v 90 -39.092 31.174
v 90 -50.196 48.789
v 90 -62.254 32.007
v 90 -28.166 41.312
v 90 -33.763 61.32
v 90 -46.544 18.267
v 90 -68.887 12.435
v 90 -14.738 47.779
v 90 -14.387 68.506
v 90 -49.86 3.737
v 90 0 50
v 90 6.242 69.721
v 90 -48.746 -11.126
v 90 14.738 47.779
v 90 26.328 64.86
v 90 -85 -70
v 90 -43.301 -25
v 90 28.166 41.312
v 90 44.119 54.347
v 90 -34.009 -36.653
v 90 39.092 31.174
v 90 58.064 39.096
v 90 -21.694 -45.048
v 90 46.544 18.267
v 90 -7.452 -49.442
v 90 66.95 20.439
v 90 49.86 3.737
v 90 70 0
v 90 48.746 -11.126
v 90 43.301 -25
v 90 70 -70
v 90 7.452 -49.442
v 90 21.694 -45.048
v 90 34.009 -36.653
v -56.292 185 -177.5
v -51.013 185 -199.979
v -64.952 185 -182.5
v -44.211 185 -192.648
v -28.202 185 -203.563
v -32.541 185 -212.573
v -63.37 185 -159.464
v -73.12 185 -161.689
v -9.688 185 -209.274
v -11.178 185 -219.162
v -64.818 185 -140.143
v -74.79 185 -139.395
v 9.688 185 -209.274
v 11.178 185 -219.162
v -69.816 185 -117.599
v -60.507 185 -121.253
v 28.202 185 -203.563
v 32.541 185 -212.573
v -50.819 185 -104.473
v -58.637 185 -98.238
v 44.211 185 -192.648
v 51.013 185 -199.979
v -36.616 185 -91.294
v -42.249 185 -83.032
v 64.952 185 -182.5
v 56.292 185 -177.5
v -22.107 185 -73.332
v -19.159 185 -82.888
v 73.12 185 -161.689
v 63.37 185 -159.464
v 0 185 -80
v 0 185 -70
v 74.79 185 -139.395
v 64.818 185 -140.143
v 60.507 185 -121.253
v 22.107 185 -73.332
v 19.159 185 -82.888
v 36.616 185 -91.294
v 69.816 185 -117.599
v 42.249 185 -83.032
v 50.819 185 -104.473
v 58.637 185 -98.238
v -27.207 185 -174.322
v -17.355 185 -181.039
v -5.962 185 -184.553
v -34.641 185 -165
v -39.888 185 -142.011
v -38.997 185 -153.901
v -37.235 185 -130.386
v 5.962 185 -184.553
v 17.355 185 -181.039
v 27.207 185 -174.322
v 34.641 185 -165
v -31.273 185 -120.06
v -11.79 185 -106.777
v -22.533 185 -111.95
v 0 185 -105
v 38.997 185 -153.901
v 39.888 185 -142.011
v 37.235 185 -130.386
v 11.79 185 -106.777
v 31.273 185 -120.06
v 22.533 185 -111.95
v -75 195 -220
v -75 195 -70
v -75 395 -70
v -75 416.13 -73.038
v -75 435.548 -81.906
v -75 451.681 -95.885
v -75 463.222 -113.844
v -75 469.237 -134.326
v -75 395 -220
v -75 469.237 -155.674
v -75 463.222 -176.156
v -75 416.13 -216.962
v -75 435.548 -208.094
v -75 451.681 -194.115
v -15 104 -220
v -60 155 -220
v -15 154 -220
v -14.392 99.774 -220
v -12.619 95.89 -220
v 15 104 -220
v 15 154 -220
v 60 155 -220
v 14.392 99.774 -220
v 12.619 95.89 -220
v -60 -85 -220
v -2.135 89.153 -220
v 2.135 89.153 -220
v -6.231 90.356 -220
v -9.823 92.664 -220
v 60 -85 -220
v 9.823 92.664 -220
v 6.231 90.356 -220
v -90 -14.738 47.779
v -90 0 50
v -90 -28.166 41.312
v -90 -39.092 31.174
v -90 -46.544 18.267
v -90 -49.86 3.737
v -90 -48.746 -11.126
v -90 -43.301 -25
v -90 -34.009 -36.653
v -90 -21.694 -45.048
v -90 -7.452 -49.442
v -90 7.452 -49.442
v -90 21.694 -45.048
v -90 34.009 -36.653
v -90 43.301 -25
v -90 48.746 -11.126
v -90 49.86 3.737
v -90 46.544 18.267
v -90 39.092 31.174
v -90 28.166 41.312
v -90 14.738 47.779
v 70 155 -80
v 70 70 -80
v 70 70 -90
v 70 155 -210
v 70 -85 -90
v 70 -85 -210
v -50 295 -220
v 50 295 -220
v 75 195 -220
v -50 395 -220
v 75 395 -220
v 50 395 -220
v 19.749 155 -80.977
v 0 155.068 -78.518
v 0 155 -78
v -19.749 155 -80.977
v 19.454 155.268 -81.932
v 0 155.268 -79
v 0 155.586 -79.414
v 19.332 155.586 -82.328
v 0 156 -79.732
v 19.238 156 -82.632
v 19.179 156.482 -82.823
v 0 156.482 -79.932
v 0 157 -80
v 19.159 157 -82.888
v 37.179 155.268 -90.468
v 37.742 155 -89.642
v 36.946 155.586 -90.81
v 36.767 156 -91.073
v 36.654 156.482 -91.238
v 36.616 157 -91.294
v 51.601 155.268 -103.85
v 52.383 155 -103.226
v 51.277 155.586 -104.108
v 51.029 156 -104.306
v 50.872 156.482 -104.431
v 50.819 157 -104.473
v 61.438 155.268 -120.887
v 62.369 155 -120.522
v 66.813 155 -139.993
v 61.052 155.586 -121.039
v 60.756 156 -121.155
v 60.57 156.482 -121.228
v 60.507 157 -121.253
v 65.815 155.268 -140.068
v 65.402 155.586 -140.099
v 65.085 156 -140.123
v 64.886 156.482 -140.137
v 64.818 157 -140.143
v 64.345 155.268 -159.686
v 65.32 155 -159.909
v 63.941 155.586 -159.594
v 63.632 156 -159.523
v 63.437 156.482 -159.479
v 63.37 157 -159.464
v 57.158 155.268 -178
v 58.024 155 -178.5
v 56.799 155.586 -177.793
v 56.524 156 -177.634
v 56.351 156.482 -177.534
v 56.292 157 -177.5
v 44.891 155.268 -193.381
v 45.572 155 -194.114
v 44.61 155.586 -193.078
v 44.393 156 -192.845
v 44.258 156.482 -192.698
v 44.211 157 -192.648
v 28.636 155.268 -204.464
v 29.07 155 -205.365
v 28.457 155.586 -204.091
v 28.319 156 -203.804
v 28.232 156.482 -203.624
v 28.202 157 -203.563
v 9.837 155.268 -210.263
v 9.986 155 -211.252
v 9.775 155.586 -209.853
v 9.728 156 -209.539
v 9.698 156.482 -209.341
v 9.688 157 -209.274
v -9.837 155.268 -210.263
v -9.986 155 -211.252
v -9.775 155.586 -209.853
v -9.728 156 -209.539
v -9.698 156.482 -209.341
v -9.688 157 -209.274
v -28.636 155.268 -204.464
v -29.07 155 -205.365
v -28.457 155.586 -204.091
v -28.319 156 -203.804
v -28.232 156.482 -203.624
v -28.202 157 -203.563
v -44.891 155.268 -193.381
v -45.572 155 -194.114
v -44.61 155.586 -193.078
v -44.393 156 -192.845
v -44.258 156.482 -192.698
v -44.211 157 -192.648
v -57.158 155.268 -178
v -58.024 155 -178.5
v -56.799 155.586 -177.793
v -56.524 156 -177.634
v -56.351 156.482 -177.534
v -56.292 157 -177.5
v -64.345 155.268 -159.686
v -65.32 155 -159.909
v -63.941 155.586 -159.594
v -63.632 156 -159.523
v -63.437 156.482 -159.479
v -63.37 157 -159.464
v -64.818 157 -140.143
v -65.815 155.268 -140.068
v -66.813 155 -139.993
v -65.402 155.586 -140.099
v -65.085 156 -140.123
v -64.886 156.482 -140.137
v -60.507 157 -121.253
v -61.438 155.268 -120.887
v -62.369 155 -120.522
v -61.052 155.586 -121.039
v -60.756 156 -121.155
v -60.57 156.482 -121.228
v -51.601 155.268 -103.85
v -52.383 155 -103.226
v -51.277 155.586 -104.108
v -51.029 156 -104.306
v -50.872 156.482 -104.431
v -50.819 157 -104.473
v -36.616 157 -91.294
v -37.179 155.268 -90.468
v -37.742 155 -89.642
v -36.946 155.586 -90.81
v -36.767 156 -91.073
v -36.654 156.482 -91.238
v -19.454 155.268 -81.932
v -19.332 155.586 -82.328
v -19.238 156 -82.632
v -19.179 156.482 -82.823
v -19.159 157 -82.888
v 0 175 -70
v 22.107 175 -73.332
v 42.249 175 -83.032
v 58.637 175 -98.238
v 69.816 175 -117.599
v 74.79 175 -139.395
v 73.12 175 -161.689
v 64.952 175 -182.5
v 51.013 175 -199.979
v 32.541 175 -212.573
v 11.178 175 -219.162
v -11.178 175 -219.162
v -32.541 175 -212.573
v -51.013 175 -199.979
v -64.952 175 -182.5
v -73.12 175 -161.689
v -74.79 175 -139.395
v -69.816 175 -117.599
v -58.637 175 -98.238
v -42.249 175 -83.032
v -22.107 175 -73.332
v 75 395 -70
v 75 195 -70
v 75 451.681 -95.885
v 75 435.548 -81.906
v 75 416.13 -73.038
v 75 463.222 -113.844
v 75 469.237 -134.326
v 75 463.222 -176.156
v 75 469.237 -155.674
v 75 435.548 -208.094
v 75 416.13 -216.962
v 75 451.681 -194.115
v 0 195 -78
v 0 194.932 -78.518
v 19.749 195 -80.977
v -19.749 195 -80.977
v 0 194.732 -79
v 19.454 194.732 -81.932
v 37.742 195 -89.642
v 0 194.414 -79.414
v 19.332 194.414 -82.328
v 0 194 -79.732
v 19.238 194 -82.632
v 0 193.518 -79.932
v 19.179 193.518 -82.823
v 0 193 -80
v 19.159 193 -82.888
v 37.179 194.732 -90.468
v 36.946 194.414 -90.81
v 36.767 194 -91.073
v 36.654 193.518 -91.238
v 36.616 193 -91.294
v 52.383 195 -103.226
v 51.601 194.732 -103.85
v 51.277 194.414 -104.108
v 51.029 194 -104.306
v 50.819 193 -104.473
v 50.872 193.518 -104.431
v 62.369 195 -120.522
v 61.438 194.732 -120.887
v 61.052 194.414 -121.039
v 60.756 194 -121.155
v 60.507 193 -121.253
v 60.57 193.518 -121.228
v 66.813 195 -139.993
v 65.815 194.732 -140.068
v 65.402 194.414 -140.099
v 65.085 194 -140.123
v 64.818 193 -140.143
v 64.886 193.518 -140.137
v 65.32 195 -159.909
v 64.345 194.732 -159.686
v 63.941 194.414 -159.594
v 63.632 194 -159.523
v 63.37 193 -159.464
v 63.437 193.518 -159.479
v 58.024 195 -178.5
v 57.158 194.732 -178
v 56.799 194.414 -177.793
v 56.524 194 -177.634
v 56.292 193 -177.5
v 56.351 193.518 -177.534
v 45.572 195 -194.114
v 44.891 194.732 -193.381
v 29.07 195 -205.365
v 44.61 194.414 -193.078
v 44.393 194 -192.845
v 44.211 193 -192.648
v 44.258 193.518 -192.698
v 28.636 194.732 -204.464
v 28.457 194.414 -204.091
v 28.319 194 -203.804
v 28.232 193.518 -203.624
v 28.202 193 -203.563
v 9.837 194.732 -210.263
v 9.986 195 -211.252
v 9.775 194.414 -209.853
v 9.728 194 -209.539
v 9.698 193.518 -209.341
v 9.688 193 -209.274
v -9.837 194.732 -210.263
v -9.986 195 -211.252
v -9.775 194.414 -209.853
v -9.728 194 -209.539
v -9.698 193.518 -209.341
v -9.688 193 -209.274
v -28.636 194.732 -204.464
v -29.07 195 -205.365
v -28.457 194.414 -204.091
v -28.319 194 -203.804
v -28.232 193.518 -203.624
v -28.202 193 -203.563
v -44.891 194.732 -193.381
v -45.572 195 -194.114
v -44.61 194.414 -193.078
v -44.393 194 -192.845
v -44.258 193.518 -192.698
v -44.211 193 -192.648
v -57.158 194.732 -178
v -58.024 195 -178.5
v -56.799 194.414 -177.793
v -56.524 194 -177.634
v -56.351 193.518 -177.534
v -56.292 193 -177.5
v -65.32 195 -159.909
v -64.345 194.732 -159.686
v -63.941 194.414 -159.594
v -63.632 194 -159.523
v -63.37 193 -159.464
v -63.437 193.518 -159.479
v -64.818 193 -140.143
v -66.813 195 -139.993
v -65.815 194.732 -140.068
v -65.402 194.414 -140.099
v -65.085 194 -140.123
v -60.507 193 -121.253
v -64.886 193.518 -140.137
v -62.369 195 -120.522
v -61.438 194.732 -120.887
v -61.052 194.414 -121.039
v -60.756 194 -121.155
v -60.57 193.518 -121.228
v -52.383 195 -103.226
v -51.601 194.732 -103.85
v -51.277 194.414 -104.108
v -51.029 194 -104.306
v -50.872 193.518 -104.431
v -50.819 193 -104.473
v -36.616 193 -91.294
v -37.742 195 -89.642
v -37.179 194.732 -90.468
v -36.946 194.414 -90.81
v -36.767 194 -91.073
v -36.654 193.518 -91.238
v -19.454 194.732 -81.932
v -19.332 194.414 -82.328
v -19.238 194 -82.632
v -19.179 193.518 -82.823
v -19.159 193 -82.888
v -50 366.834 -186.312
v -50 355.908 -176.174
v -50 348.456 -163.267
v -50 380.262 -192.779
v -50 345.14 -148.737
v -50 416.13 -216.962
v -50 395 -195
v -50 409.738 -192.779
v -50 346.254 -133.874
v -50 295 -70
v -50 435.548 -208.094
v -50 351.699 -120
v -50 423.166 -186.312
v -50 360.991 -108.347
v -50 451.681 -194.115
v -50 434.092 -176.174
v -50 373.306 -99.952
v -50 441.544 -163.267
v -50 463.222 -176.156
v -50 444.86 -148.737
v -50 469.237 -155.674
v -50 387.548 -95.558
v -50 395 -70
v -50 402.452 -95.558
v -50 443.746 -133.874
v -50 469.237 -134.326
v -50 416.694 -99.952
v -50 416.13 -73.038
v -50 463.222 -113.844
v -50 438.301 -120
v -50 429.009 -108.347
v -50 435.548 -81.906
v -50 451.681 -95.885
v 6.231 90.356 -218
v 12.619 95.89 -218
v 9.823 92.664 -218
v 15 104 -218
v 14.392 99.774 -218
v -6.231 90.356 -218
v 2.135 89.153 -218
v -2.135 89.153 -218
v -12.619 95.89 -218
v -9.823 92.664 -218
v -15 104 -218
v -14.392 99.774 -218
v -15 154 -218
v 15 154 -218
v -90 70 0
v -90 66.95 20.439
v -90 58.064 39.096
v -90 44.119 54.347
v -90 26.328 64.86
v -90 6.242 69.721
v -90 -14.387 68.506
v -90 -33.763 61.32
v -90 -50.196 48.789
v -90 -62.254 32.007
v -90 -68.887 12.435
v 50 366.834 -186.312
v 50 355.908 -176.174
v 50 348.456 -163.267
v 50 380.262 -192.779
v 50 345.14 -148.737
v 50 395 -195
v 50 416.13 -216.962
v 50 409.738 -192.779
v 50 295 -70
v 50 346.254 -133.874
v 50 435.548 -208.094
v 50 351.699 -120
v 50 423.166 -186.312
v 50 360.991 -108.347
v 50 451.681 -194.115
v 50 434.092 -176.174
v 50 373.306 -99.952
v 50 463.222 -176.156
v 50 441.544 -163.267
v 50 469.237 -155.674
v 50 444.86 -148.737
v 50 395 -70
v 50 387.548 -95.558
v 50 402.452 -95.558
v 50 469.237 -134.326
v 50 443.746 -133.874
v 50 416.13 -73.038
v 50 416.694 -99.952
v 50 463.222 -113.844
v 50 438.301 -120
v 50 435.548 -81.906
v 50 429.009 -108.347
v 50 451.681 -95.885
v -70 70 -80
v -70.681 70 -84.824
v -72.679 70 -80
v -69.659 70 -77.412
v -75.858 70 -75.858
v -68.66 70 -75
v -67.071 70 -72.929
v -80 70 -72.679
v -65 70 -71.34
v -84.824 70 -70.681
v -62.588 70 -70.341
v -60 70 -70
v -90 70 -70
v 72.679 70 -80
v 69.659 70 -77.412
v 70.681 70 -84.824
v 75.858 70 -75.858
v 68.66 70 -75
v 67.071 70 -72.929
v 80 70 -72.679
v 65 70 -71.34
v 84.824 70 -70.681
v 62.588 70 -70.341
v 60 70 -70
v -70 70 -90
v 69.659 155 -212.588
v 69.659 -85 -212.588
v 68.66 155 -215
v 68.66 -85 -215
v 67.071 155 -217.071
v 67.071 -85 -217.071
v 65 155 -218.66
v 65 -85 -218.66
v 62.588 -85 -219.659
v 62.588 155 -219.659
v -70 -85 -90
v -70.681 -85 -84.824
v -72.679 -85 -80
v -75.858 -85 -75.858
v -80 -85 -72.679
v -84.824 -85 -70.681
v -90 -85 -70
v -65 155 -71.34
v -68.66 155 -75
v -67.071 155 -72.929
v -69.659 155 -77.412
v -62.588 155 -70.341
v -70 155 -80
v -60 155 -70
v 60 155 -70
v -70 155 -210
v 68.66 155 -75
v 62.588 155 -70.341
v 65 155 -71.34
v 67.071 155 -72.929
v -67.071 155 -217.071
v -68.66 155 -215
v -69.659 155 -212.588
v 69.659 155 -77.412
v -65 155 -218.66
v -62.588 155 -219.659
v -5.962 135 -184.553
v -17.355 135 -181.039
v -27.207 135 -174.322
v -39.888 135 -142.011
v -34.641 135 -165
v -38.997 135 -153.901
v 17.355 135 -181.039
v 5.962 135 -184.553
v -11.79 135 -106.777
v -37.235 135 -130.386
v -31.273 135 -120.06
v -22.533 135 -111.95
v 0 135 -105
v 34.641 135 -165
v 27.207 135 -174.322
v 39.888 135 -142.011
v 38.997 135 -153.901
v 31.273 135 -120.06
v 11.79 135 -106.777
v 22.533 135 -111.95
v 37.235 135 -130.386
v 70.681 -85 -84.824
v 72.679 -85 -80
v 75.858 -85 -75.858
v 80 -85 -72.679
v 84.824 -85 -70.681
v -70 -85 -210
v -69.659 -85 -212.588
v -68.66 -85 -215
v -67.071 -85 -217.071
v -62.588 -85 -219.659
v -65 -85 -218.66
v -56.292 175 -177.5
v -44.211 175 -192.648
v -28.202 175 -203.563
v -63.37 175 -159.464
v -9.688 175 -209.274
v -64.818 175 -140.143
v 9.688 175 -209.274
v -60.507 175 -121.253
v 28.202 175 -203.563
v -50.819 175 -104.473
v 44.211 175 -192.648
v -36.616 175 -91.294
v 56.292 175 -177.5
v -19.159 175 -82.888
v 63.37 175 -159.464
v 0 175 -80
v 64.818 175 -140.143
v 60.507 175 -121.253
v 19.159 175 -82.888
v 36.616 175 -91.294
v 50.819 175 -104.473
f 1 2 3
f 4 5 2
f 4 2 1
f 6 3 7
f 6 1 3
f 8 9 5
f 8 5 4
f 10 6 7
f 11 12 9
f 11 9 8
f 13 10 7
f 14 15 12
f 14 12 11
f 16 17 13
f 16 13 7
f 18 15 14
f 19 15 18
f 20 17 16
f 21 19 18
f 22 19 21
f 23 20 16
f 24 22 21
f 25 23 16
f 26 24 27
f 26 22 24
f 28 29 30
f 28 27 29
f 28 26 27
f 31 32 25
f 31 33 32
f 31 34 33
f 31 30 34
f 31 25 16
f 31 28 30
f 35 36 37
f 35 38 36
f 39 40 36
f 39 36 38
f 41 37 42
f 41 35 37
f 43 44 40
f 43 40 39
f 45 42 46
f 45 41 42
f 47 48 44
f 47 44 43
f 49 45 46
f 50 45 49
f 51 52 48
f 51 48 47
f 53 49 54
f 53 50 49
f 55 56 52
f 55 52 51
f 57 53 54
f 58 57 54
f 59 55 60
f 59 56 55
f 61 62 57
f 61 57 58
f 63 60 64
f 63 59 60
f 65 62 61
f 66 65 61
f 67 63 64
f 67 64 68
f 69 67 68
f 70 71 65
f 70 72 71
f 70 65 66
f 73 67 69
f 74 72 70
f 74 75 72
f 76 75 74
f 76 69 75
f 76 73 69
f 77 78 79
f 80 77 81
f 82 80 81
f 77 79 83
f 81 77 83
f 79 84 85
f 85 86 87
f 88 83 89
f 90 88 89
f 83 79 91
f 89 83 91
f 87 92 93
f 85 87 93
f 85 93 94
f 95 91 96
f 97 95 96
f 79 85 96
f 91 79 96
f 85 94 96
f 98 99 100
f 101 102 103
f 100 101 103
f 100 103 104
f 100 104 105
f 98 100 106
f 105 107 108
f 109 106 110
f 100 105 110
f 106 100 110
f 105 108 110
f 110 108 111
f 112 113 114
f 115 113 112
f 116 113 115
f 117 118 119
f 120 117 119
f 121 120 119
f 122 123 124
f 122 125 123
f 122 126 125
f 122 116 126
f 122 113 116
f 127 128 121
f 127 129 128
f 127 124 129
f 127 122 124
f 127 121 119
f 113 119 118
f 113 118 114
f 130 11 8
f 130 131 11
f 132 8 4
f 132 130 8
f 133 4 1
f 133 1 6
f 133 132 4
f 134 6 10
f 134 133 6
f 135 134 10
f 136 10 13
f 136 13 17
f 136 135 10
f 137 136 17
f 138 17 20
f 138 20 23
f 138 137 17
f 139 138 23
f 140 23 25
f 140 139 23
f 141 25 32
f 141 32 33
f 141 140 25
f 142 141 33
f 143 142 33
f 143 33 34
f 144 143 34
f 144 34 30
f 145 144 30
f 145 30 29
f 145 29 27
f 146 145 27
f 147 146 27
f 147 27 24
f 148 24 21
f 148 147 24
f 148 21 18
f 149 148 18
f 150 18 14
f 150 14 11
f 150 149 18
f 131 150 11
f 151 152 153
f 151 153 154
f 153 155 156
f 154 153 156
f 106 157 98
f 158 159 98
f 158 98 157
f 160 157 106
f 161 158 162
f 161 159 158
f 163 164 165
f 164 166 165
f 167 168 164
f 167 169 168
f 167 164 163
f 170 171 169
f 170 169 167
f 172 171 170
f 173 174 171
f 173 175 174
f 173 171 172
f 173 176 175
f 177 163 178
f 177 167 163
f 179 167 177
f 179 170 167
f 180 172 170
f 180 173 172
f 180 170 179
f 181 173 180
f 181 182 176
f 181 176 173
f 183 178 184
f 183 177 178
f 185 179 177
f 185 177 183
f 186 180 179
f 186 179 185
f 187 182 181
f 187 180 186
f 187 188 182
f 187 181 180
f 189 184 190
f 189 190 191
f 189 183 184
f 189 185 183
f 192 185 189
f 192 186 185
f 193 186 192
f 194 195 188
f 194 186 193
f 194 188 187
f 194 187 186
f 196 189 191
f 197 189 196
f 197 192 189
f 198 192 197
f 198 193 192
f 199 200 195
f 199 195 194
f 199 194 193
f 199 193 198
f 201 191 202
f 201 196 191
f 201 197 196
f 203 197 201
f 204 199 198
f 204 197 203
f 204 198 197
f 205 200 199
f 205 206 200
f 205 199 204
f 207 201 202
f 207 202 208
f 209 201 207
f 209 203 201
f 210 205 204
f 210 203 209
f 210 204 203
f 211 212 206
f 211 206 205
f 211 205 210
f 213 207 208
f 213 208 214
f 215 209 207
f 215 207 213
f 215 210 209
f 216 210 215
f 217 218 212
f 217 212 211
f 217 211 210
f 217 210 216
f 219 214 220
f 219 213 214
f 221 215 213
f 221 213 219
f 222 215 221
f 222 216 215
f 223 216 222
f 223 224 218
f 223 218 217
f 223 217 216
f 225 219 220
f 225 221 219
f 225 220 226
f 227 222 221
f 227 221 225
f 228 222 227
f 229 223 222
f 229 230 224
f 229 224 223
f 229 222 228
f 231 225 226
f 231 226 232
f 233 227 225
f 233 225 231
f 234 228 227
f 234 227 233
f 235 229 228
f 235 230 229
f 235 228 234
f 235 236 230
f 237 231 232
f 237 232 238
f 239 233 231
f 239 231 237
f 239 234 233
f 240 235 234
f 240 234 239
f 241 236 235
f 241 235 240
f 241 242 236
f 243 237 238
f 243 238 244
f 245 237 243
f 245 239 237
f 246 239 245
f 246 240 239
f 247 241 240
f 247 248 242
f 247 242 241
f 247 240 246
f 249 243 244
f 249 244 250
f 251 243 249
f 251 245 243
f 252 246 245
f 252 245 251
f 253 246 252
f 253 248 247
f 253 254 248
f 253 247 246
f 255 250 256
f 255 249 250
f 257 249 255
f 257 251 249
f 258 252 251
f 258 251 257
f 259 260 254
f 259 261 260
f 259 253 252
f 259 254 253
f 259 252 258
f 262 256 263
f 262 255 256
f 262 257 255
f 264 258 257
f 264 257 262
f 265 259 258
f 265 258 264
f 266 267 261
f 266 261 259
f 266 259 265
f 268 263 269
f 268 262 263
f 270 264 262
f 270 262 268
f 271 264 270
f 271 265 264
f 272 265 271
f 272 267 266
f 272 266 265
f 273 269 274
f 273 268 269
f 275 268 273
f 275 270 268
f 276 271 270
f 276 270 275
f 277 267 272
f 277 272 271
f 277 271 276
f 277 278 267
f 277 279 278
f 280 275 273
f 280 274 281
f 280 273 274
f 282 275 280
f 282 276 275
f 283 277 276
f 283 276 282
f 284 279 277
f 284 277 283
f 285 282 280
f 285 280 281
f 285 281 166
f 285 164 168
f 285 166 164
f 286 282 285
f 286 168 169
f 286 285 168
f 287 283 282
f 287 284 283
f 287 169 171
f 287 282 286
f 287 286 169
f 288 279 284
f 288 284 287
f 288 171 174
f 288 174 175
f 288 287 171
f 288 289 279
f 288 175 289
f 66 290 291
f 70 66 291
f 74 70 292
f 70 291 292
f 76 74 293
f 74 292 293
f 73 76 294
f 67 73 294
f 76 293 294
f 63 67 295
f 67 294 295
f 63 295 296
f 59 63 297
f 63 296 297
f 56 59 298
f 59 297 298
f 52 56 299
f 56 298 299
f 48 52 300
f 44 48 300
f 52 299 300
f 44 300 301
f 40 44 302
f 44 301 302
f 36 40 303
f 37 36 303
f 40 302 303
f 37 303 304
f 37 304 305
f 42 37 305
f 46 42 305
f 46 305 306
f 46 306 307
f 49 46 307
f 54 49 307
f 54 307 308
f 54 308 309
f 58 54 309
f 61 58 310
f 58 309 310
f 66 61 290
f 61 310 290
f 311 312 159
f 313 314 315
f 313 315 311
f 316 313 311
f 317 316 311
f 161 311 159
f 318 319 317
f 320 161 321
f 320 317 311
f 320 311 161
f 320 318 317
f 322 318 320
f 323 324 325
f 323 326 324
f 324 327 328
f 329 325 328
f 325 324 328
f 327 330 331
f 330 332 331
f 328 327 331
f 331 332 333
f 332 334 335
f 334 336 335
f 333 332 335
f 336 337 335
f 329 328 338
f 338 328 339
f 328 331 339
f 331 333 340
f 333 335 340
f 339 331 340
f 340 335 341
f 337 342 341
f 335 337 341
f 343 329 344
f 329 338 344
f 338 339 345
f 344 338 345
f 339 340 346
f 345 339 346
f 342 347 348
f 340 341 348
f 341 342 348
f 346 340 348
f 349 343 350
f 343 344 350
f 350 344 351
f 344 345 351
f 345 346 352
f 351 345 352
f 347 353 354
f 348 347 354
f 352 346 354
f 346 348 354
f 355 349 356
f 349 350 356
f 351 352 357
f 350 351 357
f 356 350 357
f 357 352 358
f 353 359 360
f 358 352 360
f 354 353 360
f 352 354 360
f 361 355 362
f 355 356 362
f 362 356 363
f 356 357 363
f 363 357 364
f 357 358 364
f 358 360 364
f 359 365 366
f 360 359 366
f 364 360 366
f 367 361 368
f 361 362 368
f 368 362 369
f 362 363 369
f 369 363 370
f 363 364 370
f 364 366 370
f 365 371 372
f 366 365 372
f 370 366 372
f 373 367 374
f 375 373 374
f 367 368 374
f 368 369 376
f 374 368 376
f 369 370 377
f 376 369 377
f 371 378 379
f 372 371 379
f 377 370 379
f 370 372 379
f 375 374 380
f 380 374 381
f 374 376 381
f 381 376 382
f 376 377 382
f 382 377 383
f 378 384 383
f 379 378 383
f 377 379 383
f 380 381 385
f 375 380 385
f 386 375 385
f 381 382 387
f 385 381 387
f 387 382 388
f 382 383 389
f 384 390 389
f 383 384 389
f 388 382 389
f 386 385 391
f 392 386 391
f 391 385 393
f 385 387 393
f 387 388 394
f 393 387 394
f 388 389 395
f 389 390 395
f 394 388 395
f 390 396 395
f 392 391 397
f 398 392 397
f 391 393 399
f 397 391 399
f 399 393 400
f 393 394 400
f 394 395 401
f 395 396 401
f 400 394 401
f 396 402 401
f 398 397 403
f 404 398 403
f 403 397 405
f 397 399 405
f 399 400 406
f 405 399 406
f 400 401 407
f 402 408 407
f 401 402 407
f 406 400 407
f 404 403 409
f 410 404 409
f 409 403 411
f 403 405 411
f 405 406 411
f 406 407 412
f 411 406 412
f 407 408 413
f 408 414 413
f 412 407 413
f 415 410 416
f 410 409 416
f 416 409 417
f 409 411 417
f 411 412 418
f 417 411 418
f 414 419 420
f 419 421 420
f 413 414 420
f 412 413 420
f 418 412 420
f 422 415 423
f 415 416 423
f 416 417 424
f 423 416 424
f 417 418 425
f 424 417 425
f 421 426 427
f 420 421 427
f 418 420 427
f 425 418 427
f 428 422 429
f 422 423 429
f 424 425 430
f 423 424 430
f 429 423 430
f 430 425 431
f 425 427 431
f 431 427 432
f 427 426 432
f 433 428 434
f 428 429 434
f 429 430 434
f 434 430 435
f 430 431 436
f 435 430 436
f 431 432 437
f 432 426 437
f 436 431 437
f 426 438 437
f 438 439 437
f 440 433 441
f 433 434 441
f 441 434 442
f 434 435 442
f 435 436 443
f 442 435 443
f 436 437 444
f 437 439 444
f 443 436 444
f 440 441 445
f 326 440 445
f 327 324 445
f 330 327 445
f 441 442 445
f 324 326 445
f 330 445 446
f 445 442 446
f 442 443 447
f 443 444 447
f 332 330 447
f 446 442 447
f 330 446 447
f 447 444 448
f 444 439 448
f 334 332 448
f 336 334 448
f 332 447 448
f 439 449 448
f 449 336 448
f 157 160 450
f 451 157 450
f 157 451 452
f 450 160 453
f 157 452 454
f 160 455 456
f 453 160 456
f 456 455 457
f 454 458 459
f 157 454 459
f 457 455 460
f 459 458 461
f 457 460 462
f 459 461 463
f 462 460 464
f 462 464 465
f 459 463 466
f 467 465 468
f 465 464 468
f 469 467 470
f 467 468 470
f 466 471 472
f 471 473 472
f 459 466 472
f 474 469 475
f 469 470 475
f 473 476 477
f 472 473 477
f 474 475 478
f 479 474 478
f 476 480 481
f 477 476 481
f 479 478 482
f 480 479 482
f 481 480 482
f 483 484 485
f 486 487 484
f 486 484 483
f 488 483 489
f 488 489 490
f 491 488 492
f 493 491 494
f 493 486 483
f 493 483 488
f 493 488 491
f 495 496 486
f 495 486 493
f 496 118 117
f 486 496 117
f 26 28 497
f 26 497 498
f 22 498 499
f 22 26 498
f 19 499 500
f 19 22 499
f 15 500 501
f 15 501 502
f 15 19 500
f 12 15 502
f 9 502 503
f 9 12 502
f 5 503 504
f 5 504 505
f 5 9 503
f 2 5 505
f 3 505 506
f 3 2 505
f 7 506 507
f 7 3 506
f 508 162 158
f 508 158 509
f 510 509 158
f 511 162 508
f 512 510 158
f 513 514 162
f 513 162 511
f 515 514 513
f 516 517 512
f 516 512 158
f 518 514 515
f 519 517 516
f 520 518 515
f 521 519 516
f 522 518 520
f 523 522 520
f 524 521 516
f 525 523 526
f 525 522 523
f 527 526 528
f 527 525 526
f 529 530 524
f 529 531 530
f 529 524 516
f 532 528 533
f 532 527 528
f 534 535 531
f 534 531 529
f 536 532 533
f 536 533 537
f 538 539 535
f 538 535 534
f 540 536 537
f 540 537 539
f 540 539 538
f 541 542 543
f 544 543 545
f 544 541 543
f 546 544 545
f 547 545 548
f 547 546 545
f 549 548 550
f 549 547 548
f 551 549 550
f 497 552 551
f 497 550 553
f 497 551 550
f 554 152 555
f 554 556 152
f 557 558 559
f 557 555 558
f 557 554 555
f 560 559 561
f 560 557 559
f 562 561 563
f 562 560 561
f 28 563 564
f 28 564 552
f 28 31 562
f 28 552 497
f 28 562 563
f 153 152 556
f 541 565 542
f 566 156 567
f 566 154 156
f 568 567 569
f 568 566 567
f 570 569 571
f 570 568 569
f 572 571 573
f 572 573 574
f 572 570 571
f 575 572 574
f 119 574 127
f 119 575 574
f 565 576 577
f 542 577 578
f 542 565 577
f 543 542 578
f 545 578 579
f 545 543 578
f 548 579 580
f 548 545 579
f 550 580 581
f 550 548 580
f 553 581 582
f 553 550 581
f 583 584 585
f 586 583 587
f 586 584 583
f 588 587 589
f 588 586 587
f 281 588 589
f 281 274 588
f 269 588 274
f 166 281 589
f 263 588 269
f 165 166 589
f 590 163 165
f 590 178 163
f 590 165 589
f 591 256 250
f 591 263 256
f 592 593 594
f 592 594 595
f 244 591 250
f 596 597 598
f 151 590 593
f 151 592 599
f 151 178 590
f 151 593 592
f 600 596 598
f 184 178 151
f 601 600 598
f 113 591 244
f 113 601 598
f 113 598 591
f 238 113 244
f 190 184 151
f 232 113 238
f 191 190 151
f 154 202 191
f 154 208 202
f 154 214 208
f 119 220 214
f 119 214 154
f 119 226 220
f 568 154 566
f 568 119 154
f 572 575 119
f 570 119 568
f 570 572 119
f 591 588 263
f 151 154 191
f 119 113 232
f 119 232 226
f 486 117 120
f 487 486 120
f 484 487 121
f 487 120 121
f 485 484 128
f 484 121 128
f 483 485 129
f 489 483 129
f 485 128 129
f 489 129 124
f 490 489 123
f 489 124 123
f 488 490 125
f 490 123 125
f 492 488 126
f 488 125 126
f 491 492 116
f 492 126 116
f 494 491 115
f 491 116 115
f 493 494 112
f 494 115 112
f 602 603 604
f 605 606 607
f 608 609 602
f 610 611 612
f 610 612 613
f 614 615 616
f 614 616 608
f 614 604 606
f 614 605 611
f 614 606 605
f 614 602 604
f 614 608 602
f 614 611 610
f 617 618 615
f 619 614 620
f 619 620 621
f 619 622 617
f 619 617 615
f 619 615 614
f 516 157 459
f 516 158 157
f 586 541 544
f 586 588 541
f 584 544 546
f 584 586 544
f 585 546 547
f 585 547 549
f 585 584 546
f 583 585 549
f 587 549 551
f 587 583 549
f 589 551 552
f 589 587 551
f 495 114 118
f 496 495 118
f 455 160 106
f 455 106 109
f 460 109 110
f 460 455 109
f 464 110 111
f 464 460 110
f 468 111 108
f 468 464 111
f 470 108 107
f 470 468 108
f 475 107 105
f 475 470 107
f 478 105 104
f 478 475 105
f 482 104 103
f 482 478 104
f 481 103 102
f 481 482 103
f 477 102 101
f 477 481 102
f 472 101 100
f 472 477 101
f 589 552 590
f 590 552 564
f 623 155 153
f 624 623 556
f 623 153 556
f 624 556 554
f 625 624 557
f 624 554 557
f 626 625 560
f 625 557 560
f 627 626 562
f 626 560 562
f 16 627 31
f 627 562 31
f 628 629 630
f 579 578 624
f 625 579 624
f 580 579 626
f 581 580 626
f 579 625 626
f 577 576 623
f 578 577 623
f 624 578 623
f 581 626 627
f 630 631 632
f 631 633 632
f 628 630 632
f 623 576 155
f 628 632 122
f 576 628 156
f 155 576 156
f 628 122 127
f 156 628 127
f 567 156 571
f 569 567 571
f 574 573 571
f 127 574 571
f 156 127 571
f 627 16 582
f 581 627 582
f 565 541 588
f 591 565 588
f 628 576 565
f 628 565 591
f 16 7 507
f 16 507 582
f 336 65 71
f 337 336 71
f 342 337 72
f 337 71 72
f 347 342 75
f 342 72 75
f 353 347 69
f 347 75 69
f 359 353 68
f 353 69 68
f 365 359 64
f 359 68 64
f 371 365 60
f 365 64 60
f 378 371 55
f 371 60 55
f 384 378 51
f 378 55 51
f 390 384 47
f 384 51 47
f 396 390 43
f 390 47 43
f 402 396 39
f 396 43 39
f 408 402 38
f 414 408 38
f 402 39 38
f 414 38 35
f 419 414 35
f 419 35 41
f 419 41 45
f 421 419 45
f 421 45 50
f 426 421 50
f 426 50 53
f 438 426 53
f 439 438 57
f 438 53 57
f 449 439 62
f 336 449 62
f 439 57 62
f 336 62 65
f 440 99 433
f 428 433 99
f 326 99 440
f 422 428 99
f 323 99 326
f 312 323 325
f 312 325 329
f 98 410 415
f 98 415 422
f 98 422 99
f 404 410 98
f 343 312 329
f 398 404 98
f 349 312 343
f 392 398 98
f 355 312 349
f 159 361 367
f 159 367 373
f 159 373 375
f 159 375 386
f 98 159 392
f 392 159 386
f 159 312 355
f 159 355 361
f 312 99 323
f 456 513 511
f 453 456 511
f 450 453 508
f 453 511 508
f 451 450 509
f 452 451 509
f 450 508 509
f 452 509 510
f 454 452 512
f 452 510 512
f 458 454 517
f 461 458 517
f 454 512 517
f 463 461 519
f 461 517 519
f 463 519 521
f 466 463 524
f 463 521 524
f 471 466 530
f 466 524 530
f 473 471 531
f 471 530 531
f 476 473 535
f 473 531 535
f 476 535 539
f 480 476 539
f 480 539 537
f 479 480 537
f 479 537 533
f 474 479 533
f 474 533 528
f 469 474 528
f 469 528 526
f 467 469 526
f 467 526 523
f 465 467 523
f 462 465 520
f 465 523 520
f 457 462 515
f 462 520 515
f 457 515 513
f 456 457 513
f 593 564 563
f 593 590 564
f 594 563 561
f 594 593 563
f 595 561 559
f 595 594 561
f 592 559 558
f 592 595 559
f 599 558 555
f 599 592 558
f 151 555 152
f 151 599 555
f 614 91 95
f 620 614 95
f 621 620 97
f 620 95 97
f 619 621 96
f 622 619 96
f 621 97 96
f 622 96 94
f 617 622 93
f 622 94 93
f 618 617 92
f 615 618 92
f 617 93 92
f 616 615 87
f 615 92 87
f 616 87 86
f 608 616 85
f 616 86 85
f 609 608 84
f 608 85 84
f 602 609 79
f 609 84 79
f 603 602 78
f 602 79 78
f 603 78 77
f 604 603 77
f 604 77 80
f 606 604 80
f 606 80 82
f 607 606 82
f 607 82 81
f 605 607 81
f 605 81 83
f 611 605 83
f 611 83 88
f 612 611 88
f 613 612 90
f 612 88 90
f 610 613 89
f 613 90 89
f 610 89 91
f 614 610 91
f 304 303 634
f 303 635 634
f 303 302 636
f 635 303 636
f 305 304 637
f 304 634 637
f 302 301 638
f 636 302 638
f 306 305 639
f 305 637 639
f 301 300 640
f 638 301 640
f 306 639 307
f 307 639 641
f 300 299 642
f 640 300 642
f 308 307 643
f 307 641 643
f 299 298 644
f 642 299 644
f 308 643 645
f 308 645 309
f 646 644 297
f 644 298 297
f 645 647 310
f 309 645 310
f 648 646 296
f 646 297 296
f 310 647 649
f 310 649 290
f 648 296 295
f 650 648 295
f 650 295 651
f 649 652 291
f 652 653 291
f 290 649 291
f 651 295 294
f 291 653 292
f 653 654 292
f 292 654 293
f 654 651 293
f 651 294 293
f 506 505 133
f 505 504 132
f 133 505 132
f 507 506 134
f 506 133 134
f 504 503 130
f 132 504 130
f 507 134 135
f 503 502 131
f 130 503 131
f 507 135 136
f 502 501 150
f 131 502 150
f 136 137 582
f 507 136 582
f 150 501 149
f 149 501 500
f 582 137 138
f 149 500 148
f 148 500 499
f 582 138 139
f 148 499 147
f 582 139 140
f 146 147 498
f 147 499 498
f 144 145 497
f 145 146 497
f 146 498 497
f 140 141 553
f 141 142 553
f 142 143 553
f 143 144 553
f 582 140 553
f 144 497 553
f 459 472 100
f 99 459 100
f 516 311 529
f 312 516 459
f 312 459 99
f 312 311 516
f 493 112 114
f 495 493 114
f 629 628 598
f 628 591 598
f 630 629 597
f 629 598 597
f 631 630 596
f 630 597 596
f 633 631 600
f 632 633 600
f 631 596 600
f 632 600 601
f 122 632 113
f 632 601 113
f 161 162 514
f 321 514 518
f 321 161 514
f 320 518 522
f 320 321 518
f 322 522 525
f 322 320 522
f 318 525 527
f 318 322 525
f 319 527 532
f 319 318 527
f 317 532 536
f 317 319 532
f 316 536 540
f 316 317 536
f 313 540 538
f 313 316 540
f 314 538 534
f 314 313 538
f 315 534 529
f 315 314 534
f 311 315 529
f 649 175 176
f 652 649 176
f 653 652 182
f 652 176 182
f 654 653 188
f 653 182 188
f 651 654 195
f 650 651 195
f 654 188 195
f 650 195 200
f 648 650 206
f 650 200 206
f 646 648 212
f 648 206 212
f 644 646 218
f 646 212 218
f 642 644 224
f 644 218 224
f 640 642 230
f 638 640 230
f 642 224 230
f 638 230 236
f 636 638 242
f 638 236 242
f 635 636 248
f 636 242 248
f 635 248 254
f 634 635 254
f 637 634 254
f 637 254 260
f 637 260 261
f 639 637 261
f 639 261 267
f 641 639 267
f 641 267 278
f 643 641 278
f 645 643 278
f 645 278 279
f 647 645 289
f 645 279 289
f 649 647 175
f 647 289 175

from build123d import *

# Parameters (mm, degrees)
SKETCH1_W           = 140
SKETCH1_H           = 150
BOSS_EXTRUDE1_DEPTH = 240
SKETCH2_R           = 65
BOSS_EXTRUDE2_DEPTH = 20
SKETCH3_R           = 75
BOSS_EXTRUDE3_DEPTH = 10
SKETCH4_R           = 40
CUT_EXTRUDE2_DEPTH  = 50
SKETCH5_R           = 50
BOSS_EXTRUDE4_DEPTH = 90
FILLET1_R           = 2
FILLET2_R           = 20
FILLET3_R           = 10
SKETCH6_R           = 65
BOSS_EXTRUDE5_DEPTH = 10
BOSS_EXTRUDE6_DEPTH = 75
CUT_EXTRUDE3_DEPTH  = 50
SKETCH9_R           = 50
BOSS_EXTRUDE7_DEPTH = 100
FILLET4_R           = 2
CUT_EXTRUDE5_DEPTH  = 2


with BuildPart() as part:
    # Sketch1 → Boss-Extrude1 (new body)
    with BuildSketch(Plane(origin=(0, 0, 0), x_dir=(1, 0, 0), z_dir=(0, 1, 0))):
        Rectangle(SKETCH1_W, SKETCH1_H)
    extrude(amount=BOSS_EXTRUDE1_DEPTH)

    # Sketch2 → Boss-Extrude2 (add)
    with BuildSketch(Plane(origin=(0, 240, 0), x_dir=(1, 0, 0), z_dir=(0, 1, 0))):
        with Locations(Location((0, 0, 0), (0, 0, 270))):
            Circle(SKETCH2_R)
    extrude(amount=BOSS_EXTRUDE2_DEPTH)

    # Sketch3 → Boss-Extrude3 (add)
    with BuildSketch(Plane(origin=(0, 260, 0), x_dir=(1, 0, 0), z_dir=(0, 1, 0))):
        with Locations(Location((0, 0, 0), (0, 0, 270))):
            Circle(SKETCH3_R)
    extrude(amount=BOSS_EXTRUDE3_DEPTH)

    # Sketch4 → Cut-Extrude2 (cut)
    with BuildSketch(Plane(origin=(0, 270, 0), x_dir=(1, 0, 0), z_dir=(0, 1, 0))):
        with Locations(Location((0, 0, 0), (0, 0, 270))):
            Circle(SKETCH4_R)
    extrude(amount=-CUT_EXTRUDE2_DEPTH, mode=Mode.SUBTRACT)

    # Sketch5 → Boss-Extrude4 (add, symmetric)
    with BuildSketch(Plane(origin=(0, 0, 0), x_dir=(0, 0, -1), z_dir=(1, 0, 0))):
        with BuildLine():
            Line((-75, 155), (-145, 155))
            ThreePointArc((-145, 155), (-214.72110169, 91.242433746), (-157.435124514, 16.113370831))
            Line((-157.435124514, 16.113370831), (-75, 0))
            Line((-75, 0), (-75, 155))
        make_face()
        with Locations(Location((-145, 85, 0), (0, 0, 180))):
            Circle(SKETCH5_R, mode=Mode.SUBTRACT)
    extrude(amount=BOSS_EXTRUDE4_DEPTH, both=True)

    # Fillet1
    fillet1_edges = [part.edges().sort_by_distance(p)[0] for p in [
        (0, 240, -65),
    ]]
    fillet(fillet1_edges, radius=FILLET1_R)

    # Fillet2
    fillet2_edges = [part.edges().sort_by_distance(p)[0] for p in [
        (-70, 77.5, 75),
        (70, 77.5, 75),
    ]]
    fillet(fillet2_edges, radius=FILLET2_R - 0.0001)  # a hair under: the kernel refuses the full size

    # Fillet3
    fillet3_edges = [part.edges().sort_by_distance(p)[0] for p in [
        (-70, 120, -75),
        (70, 120, -75),
        (70, 197.5, 75),
        (-70, 197.5, 75),
    ]]
    fillet(fillet3_edges, radius=FILLET3_R)

    # Sketch6 → Boss-Extrude5 (add)
    with BuildSketch(Plane(origin=(0, 270, 0), x_dir=(1, 0, 0), z_dir=(0, 1, 0))):
        with Locations(Location((0, 0, 0), (0, 0, 270))):
            Circle(SKETCH6_R)
    extrude(amount=BOSS_EXTRUDE5_DEPTH)

    # Sketch7 → Boss-Extrude6 (add, symmetric)
    with BuildSketch(Plane(origin=(0, 0, 0), x_dir=(0, 0, -1), z_dir=(1, 0, 0))):
        with BuildLine():
            Line((-75, 280), (75, 280))
            Line((75, 280), (75, 480))
            ThreePointArc((75, 480), (-9.573e-06, 554.999990364), (-75, 479.999980853))
            Line((-75, 479.999980853), (-75, 280))
        make_face()
    extrude(amount=BOSS_EXTRUDE6_DEPTH, both=True)

    # Sketch8 → Cut-Extrude3 (cut, symmetric)
    with BuildSketch(Plane(origin=(0, 0, 0), x_dir=(0, 0, -1), z_dir=(1, 0, 0))):
        with BuildLine():
            Line((75, 479.999980853), (75, 379.999990427))
            Line((75, 379.999990427), (-75, 379.999990427))
            Line((-75, 379.999990427), (-75, 479.999980853))
            ThreePointArc((-75, 479.999980853), (0, 554.999990364), (75, 479.999980853))
        make_face()
    extrude(amount=CUT_EXTRUDE3_DEPTH, both=True, mode=Mode.SUBTRACT)

    # Sketch9 → Boss-Extrude7 (add)
    with BuildSketch(Plane.ZY.offset(-50)):
        with Locations(Location((0, 479.999990364, 0), (0, 0, 180))):
            Circle(SKETCH9_R)
    extrude(amount=BOSS_EXTRUDE7_DEPTH)

    # Fillet4
    fillet4_edges = [part.edges().sort_by_distance(p)[0] for p in [
        (0, 280, -65),
    ]]
    fillet(fillet4_edges, radius=FILLET4_R)

    # Sketch14 → Cut-Extrude5 (cut)
    with BuildSketch(Plane(origin=(0, 0, -75), x_dir=(-1, 0, 0), z_dir=(0, 0, -1))):
        with BuildLine():
            Line((-15, 239), (-15, 189))
            ThreePointArc((-15, 189), (0, 174), (15, 189))
            Line((15, 189), (15, 239))
            Line((15, 239), (-15, 239))
        make_face()
    extrude(amount=-CUT_EXTRUDE5_DEPTH, mode=Mode.SUBTRACT)


with BuildPart() as part_1:
    # Body-Move/Copy1: moved
    add(part.part.moved(Location((0, -85, -145))))


solid = part_1.part
